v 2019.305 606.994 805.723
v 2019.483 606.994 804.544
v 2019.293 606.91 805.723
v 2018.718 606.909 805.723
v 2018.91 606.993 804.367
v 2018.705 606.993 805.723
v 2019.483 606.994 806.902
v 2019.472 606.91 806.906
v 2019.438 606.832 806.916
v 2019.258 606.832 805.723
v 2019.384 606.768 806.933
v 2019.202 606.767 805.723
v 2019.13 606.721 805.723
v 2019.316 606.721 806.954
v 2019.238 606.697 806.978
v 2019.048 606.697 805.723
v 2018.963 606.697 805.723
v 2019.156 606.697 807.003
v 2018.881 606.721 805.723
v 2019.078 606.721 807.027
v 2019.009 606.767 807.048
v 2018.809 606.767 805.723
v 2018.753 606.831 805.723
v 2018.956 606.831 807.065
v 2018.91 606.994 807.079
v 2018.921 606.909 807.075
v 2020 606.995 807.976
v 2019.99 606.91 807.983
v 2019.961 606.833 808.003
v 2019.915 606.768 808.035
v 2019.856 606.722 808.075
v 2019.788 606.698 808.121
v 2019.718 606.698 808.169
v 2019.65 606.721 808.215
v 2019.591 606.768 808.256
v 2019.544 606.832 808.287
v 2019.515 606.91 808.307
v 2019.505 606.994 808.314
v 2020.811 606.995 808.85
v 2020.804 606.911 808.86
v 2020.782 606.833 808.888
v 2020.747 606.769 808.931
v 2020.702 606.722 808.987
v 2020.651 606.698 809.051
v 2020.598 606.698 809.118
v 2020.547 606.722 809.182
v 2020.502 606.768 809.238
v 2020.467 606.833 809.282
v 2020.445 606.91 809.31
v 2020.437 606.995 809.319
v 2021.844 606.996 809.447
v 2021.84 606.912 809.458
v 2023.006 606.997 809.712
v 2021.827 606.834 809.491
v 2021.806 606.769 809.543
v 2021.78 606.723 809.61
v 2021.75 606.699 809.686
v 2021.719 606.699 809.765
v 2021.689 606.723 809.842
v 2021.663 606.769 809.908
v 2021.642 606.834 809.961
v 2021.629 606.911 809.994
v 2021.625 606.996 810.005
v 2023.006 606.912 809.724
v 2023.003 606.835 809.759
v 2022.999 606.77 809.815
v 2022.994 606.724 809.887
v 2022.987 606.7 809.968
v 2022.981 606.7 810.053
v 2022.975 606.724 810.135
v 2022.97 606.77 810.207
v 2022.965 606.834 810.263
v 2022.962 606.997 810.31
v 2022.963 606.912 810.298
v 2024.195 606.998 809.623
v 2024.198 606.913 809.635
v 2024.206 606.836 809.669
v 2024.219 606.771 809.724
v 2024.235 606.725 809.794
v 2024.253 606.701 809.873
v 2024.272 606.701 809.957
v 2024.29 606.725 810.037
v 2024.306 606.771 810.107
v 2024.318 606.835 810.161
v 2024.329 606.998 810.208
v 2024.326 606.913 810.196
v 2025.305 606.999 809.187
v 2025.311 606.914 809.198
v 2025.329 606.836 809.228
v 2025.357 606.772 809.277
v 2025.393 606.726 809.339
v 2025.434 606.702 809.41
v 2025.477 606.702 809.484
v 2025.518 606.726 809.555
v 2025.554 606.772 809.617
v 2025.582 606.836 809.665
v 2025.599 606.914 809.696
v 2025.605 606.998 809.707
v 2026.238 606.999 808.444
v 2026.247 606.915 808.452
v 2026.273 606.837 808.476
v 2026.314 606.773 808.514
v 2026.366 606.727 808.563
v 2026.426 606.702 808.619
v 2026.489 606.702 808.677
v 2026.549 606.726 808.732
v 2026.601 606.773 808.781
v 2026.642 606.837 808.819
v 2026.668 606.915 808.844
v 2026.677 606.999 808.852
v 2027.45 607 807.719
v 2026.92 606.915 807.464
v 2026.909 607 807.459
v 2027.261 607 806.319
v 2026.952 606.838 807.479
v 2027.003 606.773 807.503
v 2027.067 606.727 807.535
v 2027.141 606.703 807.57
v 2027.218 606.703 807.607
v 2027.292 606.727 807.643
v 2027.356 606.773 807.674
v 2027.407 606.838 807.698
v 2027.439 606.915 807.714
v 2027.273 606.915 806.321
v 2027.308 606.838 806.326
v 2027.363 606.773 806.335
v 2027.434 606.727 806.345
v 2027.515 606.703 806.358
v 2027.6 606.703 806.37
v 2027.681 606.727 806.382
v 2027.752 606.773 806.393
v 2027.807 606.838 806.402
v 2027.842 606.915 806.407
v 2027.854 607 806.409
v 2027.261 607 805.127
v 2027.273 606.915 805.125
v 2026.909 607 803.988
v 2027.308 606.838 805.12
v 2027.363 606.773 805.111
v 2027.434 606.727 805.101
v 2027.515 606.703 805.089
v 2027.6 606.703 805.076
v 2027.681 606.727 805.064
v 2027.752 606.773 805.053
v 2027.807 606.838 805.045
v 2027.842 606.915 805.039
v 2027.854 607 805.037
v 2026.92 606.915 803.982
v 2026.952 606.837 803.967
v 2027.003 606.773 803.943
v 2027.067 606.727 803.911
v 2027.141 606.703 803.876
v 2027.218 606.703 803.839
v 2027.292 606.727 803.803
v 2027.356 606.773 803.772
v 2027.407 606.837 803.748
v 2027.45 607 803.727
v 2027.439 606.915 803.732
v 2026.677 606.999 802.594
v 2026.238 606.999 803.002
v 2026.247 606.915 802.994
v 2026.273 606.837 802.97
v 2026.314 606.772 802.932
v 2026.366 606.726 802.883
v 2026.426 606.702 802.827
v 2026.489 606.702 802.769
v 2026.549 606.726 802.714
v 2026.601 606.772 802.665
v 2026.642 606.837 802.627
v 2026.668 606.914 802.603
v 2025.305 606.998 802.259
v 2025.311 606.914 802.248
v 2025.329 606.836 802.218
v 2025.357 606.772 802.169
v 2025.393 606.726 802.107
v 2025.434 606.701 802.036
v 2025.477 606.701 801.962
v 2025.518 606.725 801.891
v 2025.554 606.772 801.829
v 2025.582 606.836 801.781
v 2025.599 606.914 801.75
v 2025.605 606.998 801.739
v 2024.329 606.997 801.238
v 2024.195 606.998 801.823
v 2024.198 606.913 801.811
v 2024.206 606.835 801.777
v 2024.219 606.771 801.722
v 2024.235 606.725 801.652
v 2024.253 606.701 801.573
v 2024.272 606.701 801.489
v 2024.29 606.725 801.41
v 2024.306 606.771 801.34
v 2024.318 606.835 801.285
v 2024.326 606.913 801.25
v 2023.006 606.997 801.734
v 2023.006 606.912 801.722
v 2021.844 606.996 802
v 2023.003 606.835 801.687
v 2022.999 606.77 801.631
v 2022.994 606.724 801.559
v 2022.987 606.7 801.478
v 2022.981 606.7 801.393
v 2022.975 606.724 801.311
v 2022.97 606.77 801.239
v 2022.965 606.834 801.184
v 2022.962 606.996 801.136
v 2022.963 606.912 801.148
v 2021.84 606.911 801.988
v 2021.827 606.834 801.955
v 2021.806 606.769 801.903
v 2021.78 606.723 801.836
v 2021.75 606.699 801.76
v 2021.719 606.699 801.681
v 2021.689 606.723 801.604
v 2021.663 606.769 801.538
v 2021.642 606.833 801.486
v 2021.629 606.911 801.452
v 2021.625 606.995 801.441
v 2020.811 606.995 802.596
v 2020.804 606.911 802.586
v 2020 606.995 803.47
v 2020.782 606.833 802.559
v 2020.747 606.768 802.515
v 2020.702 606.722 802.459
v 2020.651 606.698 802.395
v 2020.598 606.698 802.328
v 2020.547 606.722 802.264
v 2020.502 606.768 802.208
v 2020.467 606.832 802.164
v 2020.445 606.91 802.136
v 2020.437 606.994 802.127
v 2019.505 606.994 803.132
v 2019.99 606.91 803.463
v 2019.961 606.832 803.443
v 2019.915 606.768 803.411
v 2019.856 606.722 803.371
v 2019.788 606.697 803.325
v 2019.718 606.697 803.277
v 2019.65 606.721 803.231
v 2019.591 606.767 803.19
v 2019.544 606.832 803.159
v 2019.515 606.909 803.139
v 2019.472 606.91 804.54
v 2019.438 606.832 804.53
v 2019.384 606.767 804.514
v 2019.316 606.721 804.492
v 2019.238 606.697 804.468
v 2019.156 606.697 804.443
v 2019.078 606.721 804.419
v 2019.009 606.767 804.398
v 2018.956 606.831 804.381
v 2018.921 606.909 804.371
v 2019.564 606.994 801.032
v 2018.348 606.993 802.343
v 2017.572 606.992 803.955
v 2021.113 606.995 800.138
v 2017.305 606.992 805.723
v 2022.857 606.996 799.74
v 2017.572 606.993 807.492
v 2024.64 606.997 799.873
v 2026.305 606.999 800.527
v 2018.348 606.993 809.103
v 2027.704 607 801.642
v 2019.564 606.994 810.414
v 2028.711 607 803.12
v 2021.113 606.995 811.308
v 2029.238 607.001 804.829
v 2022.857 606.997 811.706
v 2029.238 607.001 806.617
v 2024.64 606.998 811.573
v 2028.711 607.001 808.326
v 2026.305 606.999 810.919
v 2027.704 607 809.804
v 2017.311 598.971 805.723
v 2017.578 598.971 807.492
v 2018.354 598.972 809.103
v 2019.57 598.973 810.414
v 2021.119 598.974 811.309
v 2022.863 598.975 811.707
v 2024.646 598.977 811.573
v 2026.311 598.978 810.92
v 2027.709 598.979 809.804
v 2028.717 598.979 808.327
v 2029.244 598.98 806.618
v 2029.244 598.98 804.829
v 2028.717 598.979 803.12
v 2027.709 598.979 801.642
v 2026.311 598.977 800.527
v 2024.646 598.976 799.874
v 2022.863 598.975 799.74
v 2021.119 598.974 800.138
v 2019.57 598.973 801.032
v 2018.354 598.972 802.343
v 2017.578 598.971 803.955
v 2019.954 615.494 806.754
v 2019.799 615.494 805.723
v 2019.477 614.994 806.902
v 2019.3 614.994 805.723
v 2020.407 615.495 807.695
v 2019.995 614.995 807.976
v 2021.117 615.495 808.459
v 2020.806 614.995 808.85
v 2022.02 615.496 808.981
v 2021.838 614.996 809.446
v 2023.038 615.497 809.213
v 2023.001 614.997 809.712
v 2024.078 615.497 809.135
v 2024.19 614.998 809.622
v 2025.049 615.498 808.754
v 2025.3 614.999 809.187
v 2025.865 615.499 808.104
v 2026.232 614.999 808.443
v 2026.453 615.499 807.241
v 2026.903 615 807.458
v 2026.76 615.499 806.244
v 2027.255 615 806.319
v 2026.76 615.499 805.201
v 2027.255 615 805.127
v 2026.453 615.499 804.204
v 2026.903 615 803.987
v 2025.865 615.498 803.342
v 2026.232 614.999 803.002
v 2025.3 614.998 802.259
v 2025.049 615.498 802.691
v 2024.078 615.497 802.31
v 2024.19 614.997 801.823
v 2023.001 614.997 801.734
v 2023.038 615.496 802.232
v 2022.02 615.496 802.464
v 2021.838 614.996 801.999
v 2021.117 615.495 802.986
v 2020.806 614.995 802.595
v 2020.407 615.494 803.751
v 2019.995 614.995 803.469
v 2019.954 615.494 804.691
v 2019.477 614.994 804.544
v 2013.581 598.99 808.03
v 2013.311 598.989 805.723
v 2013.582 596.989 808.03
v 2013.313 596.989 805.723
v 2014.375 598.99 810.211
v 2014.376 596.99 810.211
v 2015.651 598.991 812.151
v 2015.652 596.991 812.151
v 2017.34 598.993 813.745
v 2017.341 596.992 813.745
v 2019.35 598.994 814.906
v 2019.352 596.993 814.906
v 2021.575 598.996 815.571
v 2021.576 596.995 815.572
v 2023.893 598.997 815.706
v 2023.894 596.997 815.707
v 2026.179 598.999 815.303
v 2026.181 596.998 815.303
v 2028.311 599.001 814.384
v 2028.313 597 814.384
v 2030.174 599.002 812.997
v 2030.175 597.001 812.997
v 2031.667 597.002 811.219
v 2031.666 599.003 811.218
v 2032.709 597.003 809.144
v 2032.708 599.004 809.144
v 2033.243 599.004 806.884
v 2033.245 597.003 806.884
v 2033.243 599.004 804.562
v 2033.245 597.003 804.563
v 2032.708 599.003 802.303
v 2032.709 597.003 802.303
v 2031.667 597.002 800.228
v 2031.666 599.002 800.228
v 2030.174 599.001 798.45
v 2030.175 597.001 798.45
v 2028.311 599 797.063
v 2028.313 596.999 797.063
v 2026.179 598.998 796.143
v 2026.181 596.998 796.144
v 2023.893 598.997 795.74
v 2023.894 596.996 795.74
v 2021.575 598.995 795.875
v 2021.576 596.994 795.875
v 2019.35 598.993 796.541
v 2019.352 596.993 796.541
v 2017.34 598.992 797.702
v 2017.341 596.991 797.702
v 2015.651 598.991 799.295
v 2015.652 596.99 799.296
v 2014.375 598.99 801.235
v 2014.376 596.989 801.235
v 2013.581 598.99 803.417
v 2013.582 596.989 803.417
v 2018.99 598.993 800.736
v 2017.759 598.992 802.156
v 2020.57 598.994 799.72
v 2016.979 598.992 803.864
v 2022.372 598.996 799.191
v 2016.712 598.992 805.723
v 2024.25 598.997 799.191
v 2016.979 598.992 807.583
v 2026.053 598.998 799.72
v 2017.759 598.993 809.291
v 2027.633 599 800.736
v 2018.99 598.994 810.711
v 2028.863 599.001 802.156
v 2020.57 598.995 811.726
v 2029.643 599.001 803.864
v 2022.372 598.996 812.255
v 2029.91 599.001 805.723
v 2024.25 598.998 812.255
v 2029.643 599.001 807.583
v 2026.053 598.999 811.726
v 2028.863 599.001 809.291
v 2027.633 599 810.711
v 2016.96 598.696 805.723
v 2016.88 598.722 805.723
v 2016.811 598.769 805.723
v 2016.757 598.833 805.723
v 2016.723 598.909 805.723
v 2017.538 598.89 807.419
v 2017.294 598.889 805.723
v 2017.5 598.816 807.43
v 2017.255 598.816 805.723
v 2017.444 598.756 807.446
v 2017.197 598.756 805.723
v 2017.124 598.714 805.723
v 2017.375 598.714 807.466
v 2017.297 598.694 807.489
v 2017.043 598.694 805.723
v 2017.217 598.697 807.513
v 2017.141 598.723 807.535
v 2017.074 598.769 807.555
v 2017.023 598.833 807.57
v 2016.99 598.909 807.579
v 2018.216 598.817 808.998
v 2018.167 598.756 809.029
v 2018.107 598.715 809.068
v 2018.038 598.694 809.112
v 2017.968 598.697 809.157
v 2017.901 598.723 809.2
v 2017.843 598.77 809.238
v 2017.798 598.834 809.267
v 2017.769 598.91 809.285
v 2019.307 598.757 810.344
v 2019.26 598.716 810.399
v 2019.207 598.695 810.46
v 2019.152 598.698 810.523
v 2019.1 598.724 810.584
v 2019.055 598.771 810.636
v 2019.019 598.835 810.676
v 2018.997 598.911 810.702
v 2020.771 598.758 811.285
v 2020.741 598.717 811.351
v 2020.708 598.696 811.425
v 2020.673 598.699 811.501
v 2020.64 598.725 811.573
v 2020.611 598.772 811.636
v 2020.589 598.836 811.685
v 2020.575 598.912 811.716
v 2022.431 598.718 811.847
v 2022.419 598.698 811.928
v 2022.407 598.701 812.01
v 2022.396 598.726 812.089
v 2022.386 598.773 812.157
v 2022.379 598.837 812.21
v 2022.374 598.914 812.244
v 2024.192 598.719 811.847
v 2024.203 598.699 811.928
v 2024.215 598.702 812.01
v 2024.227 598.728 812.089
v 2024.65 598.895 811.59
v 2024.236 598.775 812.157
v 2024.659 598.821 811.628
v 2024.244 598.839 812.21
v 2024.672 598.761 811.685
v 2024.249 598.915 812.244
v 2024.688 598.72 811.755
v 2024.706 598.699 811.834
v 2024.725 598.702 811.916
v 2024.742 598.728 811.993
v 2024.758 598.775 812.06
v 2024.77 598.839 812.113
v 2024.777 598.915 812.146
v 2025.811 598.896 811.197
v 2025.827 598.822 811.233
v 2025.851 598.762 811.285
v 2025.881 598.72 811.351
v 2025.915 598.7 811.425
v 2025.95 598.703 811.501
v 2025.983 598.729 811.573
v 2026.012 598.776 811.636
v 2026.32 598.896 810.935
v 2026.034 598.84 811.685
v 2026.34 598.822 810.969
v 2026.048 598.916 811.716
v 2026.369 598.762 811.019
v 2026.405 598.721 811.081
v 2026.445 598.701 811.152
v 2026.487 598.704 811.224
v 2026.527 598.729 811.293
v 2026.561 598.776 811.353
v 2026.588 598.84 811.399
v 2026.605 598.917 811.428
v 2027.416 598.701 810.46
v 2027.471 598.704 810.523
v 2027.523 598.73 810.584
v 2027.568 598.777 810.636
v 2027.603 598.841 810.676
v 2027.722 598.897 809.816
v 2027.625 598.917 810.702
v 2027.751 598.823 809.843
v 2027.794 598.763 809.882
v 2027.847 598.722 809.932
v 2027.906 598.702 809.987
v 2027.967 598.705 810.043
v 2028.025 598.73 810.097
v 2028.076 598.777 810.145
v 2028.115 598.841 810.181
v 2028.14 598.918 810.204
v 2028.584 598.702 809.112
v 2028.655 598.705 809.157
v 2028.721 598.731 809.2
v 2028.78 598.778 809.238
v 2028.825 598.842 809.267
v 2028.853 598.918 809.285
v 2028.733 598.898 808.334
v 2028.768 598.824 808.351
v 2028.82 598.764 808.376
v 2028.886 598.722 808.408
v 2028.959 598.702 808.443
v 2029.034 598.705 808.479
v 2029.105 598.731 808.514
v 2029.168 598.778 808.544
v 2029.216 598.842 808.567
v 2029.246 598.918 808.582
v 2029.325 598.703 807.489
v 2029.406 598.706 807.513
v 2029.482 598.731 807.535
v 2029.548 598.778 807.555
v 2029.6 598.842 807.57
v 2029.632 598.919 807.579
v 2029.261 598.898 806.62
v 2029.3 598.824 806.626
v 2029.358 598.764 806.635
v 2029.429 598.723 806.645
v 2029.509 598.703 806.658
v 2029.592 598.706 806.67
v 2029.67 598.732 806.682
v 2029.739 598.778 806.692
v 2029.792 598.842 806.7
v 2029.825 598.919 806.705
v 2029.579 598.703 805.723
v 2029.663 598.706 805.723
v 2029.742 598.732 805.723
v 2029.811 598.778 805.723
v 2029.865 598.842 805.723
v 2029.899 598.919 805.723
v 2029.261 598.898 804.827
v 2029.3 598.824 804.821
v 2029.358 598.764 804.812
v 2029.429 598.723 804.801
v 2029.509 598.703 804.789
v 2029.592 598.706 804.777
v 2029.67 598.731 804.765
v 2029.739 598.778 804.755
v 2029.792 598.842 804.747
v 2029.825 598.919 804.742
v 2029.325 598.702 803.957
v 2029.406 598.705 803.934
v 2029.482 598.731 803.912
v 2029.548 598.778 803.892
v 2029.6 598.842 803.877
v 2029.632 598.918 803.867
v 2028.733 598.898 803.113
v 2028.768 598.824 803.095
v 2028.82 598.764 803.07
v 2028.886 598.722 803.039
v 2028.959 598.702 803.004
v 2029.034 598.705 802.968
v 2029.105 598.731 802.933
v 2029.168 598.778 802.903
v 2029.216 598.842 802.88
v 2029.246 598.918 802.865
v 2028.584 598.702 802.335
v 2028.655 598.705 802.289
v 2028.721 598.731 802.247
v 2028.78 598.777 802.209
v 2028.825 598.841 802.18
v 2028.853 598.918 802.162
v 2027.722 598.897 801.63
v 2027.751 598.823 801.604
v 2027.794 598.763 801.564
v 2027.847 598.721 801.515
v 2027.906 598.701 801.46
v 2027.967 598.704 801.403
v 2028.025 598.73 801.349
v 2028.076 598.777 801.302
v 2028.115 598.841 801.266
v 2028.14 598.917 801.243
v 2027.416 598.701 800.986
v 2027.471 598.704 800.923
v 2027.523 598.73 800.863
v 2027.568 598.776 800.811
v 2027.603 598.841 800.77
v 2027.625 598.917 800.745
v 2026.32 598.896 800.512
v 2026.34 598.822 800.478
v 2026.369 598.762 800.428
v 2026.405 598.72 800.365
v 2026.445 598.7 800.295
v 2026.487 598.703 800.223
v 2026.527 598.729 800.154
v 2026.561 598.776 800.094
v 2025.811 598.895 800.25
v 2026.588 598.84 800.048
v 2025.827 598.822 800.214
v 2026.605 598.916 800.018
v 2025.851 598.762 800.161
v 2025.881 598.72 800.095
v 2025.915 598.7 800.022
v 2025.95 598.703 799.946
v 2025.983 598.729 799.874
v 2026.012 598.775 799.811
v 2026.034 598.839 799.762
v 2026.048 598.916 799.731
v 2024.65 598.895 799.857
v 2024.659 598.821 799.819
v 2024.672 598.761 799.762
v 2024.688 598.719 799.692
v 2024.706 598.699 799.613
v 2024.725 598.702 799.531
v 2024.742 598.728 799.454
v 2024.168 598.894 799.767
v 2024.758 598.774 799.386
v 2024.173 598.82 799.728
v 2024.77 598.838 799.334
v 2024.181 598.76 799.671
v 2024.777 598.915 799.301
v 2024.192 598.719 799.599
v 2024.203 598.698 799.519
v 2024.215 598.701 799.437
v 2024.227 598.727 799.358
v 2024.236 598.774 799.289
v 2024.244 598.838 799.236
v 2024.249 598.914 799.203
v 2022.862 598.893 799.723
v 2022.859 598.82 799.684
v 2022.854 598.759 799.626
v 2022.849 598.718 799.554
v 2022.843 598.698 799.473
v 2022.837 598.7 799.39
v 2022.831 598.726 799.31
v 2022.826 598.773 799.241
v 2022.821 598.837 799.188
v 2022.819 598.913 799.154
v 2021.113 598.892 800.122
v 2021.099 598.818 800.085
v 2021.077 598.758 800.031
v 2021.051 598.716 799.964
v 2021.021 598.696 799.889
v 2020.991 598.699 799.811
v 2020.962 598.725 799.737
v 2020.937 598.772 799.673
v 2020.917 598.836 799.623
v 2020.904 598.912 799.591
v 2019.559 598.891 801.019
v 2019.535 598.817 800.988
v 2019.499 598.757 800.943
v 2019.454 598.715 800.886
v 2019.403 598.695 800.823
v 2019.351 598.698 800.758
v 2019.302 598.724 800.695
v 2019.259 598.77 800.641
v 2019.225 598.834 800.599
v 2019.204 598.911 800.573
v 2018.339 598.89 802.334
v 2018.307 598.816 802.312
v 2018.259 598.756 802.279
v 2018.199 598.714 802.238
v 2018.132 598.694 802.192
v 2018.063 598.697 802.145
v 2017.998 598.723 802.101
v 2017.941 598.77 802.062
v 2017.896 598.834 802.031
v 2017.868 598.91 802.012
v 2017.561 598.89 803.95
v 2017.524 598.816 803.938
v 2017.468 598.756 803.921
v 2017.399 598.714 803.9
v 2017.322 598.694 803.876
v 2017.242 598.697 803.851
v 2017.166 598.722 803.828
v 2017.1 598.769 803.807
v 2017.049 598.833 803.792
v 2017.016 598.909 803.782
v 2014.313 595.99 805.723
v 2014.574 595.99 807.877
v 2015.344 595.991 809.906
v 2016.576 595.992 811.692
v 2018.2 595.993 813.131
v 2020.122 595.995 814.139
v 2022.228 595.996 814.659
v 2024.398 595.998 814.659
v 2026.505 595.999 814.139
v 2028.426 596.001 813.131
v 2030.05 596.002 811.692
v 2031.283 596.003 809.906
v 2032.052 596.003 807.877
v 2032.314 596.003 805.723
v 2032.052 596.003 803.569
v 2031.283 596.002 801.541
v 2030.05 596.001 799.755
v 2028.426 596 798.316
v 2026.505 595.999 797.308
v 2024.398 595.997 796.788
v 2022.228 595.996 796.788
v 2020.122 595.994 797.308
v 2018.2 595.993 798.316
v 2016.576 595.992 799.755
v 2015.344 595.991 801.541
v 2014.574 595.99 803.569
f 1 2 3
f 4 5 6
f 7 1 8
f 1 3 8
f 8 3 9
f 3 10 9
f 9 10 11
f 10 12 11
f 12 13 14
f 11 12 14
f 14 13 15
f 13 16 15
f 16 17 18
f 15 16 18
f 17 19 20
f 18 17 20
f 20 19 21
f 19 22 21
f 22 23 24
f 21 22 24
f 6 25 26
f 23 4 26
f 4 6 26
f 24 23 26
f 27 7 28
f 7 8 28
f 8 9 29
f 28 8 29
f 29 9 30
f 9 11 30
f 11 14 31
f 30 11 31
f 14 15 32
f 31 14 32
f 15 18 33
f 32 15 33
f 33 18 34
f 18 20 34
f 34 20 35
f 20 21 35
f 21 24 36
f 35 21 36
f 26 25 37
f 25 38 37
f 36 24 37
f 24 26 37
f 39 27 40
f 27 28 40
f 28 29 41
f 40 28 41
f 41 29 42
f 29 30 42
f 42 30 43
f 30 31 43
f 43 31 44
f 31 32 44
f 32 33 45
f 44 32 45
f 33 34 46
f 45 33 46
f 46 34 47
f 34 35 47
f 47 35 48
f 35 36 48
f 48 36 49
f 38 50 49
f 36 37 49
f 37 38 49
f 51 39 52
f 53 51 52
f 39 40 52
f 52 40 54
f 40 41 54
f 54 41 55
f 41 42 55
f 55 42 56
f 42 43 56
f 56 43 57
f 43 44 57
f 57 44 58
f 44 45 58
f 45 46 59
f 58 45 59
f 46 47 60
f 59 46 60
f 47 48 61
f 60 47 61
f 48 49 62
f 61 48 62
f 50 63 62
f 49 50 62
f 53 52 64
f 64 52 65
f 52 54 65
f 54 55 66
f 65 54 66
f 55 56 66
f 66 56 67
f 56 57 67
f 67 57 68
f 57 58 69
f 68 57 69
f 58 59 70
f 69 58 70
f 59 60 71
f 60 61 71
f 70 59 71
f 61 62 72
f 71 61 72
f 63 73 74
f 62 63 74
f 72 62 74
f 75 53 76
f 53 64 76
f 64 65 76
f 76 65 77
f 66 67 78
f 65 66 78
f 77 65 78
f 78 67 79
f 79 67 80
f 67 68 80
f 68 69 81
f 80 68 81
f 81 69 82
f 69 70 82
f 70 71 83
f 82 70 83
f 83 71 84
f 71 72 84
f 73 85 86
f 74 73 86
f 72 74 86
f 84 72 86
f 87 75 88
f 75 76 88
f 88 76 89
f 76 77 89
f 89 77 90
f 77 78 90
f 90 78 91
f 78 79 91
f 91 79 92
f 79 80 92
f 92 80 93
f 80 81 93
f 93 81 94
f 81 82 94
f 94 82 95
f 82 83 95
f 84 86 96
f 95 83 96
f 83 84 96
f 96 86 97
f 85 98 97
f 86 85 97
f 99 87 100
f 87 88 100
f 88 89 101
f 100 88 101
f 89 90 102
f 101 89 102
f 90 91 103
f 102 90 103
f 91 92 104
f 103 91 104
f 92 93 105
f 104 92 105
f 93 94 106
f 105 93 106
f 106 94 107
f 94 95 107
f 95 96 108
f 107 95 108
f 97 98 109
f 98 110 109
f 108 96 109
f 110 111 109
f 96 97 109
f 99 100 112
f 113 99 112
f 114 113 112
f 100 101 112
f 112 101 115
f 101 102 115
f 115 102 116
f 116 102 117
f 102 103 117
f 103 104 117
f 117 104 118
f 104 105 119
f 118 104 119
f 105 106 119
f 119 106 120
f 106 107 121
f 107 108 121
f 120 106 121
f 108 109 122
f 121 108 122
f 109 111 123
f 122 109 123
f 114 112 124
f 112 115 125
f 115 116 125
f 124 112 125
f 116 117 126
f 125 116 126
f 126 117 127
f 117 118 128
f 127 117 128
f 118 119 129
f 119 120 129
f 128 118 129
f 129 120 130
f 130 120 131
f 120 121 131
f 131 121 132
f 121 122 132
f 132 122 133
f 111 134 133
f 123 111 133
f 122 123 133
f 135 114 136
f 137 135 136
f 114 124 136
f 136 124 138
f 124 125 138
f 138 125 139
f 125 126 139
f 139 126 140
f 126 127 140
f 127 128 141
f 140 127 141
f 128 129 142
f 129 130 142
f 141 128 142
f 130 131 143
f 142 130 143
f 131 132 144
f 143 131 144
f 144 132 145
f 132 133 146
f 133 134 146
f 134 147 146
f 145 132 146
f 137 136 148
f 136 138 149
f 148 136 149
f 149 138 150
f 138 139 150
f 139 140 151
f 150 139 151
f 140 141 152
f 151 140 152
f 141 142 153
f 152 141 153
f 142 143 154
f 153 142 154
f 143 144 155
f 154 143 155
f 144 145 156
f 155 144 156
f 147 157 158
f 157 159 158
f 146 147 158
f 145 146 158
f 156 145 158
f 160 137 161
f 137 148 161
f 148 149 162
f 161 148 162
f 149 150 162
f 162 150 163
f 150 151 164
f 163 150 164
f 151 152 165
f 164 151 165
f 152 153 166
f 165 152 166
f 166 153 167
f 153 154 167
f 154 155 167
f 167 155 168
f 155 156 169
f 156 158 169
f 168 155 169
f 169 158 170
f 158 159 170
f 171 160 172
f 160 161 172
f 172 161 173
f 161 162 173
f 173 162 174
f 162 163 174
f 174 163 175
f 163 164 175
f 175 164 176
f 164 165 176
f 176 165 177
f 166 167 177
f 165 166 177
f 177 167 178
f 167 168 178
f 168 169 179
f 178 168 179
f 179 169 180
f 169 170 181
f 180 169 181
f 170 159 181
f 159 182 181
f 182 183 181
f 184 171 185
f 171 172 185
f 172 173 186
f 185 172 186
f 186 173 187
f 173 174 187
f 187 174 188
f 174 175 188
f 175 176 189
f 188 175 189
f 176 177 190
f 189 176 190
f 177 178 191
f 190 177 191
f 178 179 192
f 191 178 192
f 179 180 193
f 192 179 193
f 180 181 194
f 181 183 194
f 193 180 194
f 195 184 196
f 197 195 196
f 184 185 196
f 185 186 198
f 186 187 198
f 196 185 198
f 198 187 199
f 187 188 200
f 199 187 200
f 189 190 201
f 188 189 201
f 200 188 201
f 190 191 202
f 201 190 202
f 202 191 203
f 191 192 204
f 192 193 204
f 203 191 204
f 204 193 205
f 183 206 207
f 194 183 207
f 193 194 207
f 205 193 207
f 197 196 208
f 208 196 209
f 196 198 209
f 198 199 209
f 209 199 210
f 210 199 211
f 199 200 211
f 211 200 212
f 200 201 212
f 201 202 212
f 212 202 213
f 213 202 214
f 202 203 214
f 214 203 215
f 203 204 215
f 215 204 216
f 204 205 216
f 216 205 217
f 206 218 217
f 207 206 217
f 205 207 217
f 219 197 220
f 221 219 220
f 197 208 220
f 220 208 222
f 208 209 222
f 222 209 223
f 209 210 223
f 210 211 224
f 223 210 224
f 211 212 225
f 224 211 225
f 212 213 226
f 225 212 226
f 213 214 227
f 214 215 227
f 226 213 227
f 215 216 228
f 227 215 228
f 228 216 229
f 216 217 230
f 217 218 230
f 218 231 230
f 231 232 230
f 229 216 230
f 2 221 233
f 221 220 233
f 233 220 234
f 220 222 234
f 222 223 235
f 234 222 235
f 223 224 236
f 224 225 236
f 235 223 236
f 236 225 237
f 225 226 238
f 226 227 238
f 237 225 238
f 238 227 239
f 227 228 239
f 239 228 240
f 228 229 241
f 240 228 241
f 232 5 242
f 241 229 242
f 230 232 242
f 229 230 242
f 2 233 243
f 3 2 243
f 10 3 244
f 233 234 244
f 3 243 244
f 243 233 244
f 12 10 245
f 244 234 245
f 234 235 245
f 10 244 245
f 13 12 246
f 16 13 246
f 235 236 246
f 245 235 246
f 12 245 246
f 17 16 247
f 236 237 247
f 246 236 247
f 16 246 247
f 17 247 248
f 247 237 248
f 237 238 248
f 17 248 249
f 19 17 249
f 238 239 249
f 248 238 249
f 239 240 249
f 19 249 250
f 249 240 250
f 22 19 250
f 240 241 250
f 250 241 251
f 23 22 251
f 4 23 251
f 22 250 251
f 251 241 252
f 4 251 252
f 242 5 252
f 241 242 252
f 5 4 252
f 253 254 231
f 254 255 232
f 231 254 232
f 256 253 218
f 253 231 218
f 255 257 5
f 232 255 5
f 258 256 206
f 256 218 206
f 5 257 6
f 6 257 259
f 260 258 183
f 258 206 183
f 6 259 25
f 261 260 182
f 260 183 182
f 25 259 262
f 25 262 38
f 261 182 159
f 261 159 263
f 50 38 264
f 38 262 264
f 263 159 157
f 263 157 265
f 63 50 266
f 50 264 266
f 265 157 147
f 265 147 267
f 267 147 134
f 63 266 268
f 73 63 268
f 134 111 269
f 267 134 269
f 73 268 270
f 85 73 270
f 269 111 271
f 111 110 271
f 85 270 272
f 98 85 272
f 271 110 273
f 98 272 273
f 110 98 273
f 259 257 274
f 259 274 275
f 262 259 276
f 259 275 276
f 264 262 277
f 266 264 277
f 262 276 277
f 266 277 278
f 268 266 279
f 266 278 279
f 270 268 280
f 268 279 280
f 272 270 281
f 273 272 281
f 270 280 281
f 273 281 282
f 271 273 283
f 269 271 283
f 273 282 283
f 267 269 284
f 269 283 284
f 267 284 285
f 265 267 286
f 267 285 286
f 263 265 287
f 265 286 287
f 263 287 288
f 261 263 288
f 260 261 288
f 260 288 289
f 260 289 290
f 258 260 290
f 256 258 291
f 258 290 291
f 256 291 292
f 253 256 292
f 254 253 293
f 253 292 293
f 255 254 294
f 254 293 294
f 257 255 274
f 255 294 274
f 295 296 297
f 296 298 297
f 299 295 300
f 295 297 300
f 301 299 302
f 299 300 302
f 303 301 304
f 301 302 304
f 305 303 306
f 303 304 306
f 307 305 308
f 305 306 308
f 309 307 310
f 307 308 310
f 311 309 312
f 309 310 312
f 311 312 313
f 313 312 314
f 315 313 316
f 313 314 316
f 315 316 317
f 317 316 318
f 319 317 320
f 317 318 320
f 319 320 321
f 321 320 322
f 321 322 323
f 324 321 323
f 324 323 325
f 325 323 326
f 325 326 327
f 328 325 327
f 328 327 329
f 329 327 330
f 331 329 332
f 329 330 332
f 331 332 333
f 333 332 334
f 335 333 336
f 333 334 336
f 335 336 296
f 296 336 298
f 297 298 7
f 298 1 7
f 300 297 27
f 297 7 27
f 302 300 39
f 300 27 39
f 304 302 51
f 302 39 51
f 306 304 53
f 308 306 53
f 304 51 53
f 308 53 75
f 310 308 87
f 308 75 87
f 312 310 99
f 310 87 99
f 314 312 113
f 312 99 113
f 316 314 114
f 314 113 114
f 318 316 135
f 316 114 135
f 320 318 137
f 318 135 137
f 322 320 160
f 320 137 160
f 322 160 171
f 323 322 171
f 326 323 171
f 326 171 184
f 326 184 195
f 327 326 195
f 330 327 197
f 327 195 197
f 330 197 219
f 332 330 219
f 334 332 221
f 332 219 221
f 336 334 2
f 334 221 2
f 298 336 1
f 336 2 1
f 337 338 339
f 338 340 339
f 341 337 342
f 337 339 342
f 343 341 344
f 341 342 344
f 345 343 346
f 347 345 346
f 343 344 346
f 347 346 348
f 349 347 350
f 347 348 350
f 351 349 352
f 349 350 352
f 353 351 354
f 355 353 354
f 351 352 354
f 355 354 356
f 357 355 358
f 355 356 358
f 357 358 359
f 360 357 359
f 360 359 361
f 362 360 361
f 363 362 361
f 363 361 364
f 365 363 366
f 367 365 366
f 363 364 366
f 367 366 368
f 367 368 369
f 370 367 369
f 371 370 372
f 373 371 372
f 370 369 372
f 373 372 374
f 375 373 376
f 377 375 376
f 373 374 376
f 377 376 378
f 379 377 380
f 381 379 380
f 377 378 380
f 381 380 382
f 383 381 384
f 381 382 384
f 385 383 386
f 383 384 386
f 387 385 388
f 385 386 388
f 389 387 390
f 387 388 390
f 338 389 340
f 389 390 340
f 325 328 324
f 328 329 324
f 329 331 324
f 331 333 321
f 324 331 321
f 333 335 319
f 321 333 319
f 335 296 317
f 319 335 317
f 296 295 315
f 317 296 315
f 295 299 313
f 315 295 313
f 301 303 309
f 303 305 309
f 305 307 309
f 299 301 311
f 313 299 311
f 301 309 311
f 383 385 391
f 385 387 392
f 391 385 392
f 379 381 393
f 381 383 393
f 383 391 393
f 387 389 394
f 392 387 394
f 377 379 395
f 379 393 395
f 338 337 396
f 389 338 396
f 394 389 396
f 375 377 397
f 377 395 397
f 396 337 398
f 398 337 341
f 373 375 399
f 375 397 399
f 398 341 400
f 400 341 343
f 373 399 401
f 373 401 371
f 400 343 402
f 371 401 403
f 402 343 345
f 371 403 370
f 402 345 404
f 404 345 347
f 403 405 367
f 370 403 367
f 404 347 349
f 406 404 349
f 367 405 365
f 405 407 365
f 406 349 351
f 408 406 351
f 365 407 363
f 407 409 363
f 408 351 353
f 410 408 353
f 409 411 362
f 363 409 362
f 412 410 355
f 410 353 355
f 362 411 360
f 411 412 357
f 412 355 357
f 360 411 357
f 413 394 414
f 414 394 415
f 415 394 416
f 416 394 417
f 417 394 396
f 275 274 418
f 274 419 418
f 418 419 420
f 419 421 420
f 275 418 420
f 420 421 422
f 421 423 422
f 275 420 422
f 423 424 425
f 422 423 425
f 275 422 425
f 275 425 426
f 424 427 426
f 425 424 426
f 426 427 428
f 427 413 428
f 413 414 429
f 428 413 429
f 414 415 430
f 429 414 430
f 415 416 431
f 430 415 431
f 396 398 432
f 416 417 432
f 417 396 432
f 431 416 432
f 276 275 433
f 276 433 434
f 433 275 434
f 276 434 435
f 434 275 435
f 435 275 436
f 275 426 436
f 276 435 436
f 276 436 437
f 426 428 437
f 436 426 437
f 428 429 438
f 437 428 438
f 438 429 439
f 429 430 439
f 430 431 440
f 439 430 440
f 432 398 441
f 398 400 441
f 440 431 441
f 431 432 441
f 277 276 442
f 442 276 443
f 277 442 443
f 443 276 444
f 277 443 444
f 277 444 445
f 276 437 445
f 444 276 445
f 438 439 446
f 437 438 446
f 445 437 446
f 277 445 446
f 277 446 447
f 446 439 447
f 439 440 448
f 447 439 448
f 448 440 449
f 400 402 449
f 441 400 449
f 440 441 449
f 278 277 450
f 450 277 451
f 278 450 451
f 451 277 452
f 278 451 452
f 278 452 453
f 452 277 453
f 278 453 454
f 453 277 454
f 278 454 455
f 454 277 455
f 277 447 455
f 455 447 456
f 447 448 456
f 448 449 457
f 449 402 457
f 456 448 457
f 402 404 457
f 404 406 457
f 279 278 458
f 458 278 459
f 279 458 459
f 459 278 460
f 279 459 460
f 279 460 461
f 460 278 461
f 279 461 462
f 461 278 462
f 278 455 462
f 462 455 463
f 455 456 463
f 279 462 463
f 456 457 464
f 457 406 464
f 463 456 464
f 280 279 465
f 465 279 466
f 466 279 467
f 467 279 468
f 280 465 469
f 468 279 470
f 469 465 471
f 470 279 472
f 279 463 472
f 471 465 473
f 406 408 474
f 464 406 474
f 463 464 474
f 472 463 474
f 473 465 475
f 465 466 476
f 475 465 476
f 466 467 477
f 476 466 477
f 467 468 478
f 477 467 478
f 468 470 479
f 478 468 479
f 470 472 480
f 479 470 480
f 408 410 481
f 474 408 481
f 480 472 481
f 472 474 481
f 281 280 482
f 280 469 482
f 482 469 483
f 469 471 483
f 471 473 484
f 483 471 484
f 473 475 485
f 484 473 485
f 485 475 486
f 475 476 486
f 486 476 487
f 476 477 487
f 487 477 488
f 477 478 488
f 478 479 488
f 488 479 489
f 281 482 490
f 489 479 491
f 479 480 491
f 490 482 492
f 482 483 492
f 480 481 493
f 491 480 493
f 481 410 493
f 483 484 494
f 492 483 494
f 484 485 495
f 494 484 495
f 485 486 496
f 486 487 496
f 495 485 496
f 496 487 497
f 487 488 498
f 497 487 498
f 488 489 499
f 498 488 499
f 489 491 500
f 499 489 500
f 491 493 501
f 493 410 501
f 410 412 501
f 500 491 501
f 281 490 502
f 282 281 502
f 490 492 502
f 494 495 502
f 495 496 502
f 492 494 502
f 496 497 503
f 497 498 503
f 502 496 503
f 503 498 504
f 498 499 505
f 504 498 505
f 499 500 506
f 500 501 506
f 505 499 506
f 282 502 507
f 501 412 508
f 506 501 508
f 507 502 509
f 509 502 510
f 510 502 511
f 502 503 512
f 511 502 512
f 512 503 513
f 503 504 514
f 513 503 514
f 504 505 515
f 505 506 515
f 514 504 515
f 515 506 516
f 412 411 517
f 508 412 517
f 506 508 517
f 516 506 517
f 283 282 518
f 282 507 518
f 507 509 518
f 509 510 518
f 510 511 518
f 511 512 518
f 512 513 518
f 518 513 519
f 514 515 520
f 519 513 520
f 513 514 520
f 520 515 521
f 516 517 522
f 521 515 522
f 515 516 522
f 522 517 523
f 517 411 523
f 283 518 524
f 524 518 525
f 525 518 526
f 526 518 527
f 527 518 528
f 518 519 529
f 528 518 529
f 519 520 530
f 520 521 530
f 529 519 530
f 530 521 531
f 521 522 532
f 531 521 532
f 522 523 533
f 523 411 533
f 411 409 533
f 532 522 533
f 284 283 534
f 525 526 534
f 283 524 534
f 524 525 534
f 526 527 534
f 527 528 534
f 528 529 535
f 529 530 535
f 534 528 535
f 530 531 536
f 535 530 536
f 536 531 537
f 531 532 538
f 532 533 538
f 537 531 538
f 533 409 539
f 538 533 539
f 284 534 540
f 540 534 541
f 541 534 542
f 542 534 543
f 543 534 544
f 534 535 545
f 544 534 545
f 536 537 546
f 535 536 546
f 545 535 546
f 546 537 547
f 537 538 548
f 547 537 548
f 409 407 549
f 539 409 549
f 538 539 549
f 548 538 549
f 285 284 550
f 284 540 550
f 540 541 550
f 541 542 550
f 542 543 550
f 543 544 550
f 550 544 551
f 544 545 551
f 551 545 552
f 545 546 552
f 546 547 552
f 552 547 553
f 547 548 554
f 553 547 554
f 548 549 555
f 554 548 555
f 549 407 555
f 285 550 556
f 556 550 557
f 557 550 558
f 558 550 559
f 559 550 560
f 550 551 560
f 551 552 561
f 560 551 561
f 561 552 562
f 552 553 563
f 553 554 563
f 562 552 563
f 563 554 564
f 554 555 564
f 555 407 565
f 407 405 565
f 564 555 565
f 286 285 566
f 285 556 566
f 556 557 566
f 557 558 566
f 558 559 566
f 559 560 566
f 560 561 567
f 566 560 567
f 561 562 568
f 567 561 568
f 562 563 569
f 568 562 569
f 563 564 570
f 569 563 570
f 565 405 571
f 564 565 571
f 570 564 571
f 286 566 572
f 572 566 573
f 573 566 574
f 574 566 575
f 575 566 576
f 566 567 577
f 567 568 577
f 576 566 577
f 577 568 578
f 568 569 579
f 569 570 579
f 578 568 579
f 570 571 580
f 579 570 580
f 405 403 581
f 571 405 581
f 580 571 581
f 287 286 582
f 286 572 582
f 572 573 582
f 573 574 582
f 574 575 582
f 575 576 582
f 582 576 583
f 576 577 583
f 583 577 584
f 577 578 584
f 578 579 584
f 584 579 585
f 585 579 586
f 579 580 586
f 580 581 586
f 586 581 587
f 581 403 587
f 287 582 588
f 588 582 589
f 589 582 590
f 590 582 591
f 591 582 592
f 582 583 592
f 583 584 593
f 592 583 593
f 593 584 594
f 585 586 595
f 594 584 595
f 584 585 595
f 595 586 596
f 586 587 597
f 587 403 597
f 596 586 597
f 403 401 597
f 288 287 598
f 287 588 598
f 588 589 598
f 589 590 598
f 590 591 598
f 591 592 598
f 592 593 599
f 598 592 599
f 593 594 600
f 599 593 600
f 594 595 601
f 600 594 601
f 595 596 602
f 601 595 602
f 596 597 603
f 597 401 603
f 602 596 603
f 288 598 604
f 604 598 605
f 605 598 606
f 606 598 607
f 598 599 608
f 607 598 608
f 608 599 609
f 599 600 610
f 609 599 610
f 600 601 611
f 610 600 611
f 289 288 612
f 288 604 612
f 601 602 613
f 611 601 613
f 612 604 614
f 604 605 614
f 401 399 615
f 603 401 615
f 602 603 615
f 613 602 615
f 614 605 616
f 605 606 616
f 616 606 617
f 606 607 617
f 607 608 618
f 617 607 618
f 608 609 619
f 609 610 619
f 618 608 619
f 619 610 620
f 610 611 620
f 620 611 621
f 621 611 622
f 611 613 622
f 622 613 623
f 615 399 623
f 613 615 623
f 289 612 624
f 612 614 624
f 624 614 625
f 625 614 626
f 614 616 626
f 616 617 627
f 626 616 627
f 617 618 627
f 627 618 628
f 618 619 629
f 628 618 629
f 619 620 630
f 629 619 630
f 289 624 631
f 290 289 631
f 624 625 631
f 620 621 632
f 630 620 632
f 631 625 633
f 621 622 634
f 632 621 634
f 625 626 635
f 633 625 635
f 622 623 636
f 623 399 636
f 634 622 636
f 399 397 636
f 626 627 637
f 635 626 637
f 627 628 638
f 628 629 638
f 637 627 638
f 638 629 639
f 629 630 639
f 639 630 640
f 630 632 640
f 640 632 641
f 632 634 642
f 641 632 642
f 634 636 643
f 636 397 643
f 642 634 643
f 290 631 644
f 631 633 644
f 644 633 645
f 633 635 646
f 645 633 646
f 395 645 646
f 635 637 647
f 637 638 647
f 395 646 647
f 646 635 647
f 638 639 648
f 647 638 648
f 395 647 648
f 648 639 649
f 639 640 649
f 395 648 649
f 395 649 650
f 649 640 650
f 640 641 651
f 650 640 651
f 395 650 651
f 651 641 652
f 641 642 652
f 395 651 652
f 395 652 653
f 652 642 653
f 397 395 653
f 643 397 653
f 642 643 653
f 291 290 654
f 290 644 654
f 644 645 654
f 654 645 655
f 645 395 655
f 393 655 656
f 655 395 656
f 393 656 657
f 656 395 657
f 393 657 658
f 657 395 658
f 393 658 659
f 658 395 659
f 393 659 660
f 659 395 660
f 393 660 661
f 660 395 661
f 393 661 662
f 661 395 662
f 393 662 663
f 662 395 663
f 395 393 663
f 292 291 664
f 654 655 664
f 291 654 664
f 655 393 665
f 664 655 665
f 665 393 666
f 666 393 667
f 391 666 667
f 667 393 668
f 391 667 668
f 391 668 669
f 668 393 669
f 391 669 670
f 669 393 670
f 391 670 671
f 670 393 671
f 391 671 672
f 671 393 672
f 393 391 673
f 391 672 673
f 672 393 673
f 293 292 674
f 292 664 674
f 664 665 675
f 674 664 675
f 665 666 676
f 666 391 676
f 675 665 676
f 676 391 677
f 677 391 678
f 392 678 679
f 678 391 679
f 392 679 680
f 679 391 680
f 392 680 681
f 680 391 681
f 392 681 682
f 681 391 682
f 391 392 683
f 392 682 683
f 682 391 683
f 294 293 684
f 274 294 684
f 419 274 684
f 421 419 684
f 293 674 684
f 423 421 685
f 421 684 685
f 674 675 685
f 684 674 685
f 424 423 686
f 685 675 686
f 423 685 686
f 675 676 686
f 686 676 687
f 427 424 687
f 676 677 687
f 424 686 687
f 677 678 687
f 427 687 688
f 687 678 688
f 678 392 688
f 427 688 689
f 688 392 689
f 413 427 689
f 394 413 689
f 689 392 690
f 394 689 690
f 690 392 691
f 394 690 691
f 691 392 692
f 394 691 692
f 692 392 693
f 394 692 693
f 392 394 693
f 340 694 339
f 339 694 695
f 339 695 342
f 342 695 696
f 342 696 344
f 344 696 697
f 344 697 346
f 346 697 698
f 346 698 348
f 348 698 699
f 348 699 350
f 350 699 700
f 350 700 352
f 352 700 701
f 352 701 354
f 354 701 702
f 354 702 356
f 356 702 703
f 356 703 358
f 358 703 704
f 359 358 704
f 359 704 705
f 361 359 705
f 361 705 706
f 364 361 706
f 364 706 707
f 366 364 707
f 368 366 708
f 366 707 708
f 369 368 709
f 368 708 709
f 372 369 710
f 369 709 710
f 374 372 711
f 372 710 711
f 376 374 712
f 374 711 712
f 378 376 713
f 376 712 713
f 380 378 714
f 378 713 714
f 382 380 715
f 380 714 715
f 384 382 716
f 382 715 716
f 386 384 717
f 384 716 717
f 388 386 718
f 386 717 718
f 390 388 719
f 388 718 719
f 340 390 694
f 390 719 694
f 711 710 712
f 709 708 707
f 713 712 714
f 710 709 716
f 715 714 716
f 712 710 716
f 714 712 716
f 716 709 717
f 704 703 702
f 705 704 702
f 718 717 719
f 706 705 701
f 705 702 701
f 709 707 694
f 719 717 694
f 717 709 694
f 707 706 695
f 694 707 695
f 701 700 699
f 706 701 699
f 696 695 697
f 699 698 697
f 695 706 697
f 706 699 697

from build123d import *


with BuildPart() as part:
    # Esquisse1 → Base-Révolution (revolve)
    with BuildSketch(Plane(origin=(0, 0.031816132, 805.747002229), x_dir=(-1, 0, 0), z_dir=(0, -3.948650350493743e-05, -0.999999999220408)), mode=Mode.PRIVATE) as base_r_volution_sk:
        with BuildLine():
            Line((-2032.314000082, 595.971315329), (-2023.31328189, 595.964822989))
            Line((-2023.31328189, 595.964822989), (-2023.299216279, 615.464817916))
            Line((-2023.299216279, 615.464817916), (-2026.799575635, 615.467342773))
            Line((-2026.799575635, 615.467342773), (-2027.299575635, 614.968063566))
            Line((-2027.299575635, 614.968063566), (-2027.305346123, 606.968092429))
            ThreePointArc((-2027.305346123, 606.968092429), (-2027.605368915, 606.668308824), (-2027.905345996, 606.968138169))
            Line((-2027.905345996, 606.968138169), (-2029.305345882, 606.969148008))
            Line((-2029.305345882, 606.969148008), (-2029.311131642, 598.94800312))
            ThreePointArc((-2029.311131642, 598.94800312), (-2029.62117852, 598.669386557), (-2029.910382155, 598.969582347))
            Line((-2029.910382155, 598.969582347), (-2033.311115348, 598.972035342))
            Line((-2033.311115348, 598.972035342), (-2033.312558495, 596.971315329))
            Line((-2033.312558495, 596.971315329), (-2032.314000082, 595.971315329))
        make_face()
    revolve(base_r_volution_sk.sketch.rotate(Axis((2023.313282323, 595.996038449, 805.723469686), (-0.0007213133811924766, 0.9999997390738775, -3.948649323018317e-05)), 179.999998368), axis=Axis((2023.313282323, 595.996038449, 805.723469686), (-0.0007213133811924766, 0.9999997390738775, -3.948649323018317e-05)))


solid = part.part
